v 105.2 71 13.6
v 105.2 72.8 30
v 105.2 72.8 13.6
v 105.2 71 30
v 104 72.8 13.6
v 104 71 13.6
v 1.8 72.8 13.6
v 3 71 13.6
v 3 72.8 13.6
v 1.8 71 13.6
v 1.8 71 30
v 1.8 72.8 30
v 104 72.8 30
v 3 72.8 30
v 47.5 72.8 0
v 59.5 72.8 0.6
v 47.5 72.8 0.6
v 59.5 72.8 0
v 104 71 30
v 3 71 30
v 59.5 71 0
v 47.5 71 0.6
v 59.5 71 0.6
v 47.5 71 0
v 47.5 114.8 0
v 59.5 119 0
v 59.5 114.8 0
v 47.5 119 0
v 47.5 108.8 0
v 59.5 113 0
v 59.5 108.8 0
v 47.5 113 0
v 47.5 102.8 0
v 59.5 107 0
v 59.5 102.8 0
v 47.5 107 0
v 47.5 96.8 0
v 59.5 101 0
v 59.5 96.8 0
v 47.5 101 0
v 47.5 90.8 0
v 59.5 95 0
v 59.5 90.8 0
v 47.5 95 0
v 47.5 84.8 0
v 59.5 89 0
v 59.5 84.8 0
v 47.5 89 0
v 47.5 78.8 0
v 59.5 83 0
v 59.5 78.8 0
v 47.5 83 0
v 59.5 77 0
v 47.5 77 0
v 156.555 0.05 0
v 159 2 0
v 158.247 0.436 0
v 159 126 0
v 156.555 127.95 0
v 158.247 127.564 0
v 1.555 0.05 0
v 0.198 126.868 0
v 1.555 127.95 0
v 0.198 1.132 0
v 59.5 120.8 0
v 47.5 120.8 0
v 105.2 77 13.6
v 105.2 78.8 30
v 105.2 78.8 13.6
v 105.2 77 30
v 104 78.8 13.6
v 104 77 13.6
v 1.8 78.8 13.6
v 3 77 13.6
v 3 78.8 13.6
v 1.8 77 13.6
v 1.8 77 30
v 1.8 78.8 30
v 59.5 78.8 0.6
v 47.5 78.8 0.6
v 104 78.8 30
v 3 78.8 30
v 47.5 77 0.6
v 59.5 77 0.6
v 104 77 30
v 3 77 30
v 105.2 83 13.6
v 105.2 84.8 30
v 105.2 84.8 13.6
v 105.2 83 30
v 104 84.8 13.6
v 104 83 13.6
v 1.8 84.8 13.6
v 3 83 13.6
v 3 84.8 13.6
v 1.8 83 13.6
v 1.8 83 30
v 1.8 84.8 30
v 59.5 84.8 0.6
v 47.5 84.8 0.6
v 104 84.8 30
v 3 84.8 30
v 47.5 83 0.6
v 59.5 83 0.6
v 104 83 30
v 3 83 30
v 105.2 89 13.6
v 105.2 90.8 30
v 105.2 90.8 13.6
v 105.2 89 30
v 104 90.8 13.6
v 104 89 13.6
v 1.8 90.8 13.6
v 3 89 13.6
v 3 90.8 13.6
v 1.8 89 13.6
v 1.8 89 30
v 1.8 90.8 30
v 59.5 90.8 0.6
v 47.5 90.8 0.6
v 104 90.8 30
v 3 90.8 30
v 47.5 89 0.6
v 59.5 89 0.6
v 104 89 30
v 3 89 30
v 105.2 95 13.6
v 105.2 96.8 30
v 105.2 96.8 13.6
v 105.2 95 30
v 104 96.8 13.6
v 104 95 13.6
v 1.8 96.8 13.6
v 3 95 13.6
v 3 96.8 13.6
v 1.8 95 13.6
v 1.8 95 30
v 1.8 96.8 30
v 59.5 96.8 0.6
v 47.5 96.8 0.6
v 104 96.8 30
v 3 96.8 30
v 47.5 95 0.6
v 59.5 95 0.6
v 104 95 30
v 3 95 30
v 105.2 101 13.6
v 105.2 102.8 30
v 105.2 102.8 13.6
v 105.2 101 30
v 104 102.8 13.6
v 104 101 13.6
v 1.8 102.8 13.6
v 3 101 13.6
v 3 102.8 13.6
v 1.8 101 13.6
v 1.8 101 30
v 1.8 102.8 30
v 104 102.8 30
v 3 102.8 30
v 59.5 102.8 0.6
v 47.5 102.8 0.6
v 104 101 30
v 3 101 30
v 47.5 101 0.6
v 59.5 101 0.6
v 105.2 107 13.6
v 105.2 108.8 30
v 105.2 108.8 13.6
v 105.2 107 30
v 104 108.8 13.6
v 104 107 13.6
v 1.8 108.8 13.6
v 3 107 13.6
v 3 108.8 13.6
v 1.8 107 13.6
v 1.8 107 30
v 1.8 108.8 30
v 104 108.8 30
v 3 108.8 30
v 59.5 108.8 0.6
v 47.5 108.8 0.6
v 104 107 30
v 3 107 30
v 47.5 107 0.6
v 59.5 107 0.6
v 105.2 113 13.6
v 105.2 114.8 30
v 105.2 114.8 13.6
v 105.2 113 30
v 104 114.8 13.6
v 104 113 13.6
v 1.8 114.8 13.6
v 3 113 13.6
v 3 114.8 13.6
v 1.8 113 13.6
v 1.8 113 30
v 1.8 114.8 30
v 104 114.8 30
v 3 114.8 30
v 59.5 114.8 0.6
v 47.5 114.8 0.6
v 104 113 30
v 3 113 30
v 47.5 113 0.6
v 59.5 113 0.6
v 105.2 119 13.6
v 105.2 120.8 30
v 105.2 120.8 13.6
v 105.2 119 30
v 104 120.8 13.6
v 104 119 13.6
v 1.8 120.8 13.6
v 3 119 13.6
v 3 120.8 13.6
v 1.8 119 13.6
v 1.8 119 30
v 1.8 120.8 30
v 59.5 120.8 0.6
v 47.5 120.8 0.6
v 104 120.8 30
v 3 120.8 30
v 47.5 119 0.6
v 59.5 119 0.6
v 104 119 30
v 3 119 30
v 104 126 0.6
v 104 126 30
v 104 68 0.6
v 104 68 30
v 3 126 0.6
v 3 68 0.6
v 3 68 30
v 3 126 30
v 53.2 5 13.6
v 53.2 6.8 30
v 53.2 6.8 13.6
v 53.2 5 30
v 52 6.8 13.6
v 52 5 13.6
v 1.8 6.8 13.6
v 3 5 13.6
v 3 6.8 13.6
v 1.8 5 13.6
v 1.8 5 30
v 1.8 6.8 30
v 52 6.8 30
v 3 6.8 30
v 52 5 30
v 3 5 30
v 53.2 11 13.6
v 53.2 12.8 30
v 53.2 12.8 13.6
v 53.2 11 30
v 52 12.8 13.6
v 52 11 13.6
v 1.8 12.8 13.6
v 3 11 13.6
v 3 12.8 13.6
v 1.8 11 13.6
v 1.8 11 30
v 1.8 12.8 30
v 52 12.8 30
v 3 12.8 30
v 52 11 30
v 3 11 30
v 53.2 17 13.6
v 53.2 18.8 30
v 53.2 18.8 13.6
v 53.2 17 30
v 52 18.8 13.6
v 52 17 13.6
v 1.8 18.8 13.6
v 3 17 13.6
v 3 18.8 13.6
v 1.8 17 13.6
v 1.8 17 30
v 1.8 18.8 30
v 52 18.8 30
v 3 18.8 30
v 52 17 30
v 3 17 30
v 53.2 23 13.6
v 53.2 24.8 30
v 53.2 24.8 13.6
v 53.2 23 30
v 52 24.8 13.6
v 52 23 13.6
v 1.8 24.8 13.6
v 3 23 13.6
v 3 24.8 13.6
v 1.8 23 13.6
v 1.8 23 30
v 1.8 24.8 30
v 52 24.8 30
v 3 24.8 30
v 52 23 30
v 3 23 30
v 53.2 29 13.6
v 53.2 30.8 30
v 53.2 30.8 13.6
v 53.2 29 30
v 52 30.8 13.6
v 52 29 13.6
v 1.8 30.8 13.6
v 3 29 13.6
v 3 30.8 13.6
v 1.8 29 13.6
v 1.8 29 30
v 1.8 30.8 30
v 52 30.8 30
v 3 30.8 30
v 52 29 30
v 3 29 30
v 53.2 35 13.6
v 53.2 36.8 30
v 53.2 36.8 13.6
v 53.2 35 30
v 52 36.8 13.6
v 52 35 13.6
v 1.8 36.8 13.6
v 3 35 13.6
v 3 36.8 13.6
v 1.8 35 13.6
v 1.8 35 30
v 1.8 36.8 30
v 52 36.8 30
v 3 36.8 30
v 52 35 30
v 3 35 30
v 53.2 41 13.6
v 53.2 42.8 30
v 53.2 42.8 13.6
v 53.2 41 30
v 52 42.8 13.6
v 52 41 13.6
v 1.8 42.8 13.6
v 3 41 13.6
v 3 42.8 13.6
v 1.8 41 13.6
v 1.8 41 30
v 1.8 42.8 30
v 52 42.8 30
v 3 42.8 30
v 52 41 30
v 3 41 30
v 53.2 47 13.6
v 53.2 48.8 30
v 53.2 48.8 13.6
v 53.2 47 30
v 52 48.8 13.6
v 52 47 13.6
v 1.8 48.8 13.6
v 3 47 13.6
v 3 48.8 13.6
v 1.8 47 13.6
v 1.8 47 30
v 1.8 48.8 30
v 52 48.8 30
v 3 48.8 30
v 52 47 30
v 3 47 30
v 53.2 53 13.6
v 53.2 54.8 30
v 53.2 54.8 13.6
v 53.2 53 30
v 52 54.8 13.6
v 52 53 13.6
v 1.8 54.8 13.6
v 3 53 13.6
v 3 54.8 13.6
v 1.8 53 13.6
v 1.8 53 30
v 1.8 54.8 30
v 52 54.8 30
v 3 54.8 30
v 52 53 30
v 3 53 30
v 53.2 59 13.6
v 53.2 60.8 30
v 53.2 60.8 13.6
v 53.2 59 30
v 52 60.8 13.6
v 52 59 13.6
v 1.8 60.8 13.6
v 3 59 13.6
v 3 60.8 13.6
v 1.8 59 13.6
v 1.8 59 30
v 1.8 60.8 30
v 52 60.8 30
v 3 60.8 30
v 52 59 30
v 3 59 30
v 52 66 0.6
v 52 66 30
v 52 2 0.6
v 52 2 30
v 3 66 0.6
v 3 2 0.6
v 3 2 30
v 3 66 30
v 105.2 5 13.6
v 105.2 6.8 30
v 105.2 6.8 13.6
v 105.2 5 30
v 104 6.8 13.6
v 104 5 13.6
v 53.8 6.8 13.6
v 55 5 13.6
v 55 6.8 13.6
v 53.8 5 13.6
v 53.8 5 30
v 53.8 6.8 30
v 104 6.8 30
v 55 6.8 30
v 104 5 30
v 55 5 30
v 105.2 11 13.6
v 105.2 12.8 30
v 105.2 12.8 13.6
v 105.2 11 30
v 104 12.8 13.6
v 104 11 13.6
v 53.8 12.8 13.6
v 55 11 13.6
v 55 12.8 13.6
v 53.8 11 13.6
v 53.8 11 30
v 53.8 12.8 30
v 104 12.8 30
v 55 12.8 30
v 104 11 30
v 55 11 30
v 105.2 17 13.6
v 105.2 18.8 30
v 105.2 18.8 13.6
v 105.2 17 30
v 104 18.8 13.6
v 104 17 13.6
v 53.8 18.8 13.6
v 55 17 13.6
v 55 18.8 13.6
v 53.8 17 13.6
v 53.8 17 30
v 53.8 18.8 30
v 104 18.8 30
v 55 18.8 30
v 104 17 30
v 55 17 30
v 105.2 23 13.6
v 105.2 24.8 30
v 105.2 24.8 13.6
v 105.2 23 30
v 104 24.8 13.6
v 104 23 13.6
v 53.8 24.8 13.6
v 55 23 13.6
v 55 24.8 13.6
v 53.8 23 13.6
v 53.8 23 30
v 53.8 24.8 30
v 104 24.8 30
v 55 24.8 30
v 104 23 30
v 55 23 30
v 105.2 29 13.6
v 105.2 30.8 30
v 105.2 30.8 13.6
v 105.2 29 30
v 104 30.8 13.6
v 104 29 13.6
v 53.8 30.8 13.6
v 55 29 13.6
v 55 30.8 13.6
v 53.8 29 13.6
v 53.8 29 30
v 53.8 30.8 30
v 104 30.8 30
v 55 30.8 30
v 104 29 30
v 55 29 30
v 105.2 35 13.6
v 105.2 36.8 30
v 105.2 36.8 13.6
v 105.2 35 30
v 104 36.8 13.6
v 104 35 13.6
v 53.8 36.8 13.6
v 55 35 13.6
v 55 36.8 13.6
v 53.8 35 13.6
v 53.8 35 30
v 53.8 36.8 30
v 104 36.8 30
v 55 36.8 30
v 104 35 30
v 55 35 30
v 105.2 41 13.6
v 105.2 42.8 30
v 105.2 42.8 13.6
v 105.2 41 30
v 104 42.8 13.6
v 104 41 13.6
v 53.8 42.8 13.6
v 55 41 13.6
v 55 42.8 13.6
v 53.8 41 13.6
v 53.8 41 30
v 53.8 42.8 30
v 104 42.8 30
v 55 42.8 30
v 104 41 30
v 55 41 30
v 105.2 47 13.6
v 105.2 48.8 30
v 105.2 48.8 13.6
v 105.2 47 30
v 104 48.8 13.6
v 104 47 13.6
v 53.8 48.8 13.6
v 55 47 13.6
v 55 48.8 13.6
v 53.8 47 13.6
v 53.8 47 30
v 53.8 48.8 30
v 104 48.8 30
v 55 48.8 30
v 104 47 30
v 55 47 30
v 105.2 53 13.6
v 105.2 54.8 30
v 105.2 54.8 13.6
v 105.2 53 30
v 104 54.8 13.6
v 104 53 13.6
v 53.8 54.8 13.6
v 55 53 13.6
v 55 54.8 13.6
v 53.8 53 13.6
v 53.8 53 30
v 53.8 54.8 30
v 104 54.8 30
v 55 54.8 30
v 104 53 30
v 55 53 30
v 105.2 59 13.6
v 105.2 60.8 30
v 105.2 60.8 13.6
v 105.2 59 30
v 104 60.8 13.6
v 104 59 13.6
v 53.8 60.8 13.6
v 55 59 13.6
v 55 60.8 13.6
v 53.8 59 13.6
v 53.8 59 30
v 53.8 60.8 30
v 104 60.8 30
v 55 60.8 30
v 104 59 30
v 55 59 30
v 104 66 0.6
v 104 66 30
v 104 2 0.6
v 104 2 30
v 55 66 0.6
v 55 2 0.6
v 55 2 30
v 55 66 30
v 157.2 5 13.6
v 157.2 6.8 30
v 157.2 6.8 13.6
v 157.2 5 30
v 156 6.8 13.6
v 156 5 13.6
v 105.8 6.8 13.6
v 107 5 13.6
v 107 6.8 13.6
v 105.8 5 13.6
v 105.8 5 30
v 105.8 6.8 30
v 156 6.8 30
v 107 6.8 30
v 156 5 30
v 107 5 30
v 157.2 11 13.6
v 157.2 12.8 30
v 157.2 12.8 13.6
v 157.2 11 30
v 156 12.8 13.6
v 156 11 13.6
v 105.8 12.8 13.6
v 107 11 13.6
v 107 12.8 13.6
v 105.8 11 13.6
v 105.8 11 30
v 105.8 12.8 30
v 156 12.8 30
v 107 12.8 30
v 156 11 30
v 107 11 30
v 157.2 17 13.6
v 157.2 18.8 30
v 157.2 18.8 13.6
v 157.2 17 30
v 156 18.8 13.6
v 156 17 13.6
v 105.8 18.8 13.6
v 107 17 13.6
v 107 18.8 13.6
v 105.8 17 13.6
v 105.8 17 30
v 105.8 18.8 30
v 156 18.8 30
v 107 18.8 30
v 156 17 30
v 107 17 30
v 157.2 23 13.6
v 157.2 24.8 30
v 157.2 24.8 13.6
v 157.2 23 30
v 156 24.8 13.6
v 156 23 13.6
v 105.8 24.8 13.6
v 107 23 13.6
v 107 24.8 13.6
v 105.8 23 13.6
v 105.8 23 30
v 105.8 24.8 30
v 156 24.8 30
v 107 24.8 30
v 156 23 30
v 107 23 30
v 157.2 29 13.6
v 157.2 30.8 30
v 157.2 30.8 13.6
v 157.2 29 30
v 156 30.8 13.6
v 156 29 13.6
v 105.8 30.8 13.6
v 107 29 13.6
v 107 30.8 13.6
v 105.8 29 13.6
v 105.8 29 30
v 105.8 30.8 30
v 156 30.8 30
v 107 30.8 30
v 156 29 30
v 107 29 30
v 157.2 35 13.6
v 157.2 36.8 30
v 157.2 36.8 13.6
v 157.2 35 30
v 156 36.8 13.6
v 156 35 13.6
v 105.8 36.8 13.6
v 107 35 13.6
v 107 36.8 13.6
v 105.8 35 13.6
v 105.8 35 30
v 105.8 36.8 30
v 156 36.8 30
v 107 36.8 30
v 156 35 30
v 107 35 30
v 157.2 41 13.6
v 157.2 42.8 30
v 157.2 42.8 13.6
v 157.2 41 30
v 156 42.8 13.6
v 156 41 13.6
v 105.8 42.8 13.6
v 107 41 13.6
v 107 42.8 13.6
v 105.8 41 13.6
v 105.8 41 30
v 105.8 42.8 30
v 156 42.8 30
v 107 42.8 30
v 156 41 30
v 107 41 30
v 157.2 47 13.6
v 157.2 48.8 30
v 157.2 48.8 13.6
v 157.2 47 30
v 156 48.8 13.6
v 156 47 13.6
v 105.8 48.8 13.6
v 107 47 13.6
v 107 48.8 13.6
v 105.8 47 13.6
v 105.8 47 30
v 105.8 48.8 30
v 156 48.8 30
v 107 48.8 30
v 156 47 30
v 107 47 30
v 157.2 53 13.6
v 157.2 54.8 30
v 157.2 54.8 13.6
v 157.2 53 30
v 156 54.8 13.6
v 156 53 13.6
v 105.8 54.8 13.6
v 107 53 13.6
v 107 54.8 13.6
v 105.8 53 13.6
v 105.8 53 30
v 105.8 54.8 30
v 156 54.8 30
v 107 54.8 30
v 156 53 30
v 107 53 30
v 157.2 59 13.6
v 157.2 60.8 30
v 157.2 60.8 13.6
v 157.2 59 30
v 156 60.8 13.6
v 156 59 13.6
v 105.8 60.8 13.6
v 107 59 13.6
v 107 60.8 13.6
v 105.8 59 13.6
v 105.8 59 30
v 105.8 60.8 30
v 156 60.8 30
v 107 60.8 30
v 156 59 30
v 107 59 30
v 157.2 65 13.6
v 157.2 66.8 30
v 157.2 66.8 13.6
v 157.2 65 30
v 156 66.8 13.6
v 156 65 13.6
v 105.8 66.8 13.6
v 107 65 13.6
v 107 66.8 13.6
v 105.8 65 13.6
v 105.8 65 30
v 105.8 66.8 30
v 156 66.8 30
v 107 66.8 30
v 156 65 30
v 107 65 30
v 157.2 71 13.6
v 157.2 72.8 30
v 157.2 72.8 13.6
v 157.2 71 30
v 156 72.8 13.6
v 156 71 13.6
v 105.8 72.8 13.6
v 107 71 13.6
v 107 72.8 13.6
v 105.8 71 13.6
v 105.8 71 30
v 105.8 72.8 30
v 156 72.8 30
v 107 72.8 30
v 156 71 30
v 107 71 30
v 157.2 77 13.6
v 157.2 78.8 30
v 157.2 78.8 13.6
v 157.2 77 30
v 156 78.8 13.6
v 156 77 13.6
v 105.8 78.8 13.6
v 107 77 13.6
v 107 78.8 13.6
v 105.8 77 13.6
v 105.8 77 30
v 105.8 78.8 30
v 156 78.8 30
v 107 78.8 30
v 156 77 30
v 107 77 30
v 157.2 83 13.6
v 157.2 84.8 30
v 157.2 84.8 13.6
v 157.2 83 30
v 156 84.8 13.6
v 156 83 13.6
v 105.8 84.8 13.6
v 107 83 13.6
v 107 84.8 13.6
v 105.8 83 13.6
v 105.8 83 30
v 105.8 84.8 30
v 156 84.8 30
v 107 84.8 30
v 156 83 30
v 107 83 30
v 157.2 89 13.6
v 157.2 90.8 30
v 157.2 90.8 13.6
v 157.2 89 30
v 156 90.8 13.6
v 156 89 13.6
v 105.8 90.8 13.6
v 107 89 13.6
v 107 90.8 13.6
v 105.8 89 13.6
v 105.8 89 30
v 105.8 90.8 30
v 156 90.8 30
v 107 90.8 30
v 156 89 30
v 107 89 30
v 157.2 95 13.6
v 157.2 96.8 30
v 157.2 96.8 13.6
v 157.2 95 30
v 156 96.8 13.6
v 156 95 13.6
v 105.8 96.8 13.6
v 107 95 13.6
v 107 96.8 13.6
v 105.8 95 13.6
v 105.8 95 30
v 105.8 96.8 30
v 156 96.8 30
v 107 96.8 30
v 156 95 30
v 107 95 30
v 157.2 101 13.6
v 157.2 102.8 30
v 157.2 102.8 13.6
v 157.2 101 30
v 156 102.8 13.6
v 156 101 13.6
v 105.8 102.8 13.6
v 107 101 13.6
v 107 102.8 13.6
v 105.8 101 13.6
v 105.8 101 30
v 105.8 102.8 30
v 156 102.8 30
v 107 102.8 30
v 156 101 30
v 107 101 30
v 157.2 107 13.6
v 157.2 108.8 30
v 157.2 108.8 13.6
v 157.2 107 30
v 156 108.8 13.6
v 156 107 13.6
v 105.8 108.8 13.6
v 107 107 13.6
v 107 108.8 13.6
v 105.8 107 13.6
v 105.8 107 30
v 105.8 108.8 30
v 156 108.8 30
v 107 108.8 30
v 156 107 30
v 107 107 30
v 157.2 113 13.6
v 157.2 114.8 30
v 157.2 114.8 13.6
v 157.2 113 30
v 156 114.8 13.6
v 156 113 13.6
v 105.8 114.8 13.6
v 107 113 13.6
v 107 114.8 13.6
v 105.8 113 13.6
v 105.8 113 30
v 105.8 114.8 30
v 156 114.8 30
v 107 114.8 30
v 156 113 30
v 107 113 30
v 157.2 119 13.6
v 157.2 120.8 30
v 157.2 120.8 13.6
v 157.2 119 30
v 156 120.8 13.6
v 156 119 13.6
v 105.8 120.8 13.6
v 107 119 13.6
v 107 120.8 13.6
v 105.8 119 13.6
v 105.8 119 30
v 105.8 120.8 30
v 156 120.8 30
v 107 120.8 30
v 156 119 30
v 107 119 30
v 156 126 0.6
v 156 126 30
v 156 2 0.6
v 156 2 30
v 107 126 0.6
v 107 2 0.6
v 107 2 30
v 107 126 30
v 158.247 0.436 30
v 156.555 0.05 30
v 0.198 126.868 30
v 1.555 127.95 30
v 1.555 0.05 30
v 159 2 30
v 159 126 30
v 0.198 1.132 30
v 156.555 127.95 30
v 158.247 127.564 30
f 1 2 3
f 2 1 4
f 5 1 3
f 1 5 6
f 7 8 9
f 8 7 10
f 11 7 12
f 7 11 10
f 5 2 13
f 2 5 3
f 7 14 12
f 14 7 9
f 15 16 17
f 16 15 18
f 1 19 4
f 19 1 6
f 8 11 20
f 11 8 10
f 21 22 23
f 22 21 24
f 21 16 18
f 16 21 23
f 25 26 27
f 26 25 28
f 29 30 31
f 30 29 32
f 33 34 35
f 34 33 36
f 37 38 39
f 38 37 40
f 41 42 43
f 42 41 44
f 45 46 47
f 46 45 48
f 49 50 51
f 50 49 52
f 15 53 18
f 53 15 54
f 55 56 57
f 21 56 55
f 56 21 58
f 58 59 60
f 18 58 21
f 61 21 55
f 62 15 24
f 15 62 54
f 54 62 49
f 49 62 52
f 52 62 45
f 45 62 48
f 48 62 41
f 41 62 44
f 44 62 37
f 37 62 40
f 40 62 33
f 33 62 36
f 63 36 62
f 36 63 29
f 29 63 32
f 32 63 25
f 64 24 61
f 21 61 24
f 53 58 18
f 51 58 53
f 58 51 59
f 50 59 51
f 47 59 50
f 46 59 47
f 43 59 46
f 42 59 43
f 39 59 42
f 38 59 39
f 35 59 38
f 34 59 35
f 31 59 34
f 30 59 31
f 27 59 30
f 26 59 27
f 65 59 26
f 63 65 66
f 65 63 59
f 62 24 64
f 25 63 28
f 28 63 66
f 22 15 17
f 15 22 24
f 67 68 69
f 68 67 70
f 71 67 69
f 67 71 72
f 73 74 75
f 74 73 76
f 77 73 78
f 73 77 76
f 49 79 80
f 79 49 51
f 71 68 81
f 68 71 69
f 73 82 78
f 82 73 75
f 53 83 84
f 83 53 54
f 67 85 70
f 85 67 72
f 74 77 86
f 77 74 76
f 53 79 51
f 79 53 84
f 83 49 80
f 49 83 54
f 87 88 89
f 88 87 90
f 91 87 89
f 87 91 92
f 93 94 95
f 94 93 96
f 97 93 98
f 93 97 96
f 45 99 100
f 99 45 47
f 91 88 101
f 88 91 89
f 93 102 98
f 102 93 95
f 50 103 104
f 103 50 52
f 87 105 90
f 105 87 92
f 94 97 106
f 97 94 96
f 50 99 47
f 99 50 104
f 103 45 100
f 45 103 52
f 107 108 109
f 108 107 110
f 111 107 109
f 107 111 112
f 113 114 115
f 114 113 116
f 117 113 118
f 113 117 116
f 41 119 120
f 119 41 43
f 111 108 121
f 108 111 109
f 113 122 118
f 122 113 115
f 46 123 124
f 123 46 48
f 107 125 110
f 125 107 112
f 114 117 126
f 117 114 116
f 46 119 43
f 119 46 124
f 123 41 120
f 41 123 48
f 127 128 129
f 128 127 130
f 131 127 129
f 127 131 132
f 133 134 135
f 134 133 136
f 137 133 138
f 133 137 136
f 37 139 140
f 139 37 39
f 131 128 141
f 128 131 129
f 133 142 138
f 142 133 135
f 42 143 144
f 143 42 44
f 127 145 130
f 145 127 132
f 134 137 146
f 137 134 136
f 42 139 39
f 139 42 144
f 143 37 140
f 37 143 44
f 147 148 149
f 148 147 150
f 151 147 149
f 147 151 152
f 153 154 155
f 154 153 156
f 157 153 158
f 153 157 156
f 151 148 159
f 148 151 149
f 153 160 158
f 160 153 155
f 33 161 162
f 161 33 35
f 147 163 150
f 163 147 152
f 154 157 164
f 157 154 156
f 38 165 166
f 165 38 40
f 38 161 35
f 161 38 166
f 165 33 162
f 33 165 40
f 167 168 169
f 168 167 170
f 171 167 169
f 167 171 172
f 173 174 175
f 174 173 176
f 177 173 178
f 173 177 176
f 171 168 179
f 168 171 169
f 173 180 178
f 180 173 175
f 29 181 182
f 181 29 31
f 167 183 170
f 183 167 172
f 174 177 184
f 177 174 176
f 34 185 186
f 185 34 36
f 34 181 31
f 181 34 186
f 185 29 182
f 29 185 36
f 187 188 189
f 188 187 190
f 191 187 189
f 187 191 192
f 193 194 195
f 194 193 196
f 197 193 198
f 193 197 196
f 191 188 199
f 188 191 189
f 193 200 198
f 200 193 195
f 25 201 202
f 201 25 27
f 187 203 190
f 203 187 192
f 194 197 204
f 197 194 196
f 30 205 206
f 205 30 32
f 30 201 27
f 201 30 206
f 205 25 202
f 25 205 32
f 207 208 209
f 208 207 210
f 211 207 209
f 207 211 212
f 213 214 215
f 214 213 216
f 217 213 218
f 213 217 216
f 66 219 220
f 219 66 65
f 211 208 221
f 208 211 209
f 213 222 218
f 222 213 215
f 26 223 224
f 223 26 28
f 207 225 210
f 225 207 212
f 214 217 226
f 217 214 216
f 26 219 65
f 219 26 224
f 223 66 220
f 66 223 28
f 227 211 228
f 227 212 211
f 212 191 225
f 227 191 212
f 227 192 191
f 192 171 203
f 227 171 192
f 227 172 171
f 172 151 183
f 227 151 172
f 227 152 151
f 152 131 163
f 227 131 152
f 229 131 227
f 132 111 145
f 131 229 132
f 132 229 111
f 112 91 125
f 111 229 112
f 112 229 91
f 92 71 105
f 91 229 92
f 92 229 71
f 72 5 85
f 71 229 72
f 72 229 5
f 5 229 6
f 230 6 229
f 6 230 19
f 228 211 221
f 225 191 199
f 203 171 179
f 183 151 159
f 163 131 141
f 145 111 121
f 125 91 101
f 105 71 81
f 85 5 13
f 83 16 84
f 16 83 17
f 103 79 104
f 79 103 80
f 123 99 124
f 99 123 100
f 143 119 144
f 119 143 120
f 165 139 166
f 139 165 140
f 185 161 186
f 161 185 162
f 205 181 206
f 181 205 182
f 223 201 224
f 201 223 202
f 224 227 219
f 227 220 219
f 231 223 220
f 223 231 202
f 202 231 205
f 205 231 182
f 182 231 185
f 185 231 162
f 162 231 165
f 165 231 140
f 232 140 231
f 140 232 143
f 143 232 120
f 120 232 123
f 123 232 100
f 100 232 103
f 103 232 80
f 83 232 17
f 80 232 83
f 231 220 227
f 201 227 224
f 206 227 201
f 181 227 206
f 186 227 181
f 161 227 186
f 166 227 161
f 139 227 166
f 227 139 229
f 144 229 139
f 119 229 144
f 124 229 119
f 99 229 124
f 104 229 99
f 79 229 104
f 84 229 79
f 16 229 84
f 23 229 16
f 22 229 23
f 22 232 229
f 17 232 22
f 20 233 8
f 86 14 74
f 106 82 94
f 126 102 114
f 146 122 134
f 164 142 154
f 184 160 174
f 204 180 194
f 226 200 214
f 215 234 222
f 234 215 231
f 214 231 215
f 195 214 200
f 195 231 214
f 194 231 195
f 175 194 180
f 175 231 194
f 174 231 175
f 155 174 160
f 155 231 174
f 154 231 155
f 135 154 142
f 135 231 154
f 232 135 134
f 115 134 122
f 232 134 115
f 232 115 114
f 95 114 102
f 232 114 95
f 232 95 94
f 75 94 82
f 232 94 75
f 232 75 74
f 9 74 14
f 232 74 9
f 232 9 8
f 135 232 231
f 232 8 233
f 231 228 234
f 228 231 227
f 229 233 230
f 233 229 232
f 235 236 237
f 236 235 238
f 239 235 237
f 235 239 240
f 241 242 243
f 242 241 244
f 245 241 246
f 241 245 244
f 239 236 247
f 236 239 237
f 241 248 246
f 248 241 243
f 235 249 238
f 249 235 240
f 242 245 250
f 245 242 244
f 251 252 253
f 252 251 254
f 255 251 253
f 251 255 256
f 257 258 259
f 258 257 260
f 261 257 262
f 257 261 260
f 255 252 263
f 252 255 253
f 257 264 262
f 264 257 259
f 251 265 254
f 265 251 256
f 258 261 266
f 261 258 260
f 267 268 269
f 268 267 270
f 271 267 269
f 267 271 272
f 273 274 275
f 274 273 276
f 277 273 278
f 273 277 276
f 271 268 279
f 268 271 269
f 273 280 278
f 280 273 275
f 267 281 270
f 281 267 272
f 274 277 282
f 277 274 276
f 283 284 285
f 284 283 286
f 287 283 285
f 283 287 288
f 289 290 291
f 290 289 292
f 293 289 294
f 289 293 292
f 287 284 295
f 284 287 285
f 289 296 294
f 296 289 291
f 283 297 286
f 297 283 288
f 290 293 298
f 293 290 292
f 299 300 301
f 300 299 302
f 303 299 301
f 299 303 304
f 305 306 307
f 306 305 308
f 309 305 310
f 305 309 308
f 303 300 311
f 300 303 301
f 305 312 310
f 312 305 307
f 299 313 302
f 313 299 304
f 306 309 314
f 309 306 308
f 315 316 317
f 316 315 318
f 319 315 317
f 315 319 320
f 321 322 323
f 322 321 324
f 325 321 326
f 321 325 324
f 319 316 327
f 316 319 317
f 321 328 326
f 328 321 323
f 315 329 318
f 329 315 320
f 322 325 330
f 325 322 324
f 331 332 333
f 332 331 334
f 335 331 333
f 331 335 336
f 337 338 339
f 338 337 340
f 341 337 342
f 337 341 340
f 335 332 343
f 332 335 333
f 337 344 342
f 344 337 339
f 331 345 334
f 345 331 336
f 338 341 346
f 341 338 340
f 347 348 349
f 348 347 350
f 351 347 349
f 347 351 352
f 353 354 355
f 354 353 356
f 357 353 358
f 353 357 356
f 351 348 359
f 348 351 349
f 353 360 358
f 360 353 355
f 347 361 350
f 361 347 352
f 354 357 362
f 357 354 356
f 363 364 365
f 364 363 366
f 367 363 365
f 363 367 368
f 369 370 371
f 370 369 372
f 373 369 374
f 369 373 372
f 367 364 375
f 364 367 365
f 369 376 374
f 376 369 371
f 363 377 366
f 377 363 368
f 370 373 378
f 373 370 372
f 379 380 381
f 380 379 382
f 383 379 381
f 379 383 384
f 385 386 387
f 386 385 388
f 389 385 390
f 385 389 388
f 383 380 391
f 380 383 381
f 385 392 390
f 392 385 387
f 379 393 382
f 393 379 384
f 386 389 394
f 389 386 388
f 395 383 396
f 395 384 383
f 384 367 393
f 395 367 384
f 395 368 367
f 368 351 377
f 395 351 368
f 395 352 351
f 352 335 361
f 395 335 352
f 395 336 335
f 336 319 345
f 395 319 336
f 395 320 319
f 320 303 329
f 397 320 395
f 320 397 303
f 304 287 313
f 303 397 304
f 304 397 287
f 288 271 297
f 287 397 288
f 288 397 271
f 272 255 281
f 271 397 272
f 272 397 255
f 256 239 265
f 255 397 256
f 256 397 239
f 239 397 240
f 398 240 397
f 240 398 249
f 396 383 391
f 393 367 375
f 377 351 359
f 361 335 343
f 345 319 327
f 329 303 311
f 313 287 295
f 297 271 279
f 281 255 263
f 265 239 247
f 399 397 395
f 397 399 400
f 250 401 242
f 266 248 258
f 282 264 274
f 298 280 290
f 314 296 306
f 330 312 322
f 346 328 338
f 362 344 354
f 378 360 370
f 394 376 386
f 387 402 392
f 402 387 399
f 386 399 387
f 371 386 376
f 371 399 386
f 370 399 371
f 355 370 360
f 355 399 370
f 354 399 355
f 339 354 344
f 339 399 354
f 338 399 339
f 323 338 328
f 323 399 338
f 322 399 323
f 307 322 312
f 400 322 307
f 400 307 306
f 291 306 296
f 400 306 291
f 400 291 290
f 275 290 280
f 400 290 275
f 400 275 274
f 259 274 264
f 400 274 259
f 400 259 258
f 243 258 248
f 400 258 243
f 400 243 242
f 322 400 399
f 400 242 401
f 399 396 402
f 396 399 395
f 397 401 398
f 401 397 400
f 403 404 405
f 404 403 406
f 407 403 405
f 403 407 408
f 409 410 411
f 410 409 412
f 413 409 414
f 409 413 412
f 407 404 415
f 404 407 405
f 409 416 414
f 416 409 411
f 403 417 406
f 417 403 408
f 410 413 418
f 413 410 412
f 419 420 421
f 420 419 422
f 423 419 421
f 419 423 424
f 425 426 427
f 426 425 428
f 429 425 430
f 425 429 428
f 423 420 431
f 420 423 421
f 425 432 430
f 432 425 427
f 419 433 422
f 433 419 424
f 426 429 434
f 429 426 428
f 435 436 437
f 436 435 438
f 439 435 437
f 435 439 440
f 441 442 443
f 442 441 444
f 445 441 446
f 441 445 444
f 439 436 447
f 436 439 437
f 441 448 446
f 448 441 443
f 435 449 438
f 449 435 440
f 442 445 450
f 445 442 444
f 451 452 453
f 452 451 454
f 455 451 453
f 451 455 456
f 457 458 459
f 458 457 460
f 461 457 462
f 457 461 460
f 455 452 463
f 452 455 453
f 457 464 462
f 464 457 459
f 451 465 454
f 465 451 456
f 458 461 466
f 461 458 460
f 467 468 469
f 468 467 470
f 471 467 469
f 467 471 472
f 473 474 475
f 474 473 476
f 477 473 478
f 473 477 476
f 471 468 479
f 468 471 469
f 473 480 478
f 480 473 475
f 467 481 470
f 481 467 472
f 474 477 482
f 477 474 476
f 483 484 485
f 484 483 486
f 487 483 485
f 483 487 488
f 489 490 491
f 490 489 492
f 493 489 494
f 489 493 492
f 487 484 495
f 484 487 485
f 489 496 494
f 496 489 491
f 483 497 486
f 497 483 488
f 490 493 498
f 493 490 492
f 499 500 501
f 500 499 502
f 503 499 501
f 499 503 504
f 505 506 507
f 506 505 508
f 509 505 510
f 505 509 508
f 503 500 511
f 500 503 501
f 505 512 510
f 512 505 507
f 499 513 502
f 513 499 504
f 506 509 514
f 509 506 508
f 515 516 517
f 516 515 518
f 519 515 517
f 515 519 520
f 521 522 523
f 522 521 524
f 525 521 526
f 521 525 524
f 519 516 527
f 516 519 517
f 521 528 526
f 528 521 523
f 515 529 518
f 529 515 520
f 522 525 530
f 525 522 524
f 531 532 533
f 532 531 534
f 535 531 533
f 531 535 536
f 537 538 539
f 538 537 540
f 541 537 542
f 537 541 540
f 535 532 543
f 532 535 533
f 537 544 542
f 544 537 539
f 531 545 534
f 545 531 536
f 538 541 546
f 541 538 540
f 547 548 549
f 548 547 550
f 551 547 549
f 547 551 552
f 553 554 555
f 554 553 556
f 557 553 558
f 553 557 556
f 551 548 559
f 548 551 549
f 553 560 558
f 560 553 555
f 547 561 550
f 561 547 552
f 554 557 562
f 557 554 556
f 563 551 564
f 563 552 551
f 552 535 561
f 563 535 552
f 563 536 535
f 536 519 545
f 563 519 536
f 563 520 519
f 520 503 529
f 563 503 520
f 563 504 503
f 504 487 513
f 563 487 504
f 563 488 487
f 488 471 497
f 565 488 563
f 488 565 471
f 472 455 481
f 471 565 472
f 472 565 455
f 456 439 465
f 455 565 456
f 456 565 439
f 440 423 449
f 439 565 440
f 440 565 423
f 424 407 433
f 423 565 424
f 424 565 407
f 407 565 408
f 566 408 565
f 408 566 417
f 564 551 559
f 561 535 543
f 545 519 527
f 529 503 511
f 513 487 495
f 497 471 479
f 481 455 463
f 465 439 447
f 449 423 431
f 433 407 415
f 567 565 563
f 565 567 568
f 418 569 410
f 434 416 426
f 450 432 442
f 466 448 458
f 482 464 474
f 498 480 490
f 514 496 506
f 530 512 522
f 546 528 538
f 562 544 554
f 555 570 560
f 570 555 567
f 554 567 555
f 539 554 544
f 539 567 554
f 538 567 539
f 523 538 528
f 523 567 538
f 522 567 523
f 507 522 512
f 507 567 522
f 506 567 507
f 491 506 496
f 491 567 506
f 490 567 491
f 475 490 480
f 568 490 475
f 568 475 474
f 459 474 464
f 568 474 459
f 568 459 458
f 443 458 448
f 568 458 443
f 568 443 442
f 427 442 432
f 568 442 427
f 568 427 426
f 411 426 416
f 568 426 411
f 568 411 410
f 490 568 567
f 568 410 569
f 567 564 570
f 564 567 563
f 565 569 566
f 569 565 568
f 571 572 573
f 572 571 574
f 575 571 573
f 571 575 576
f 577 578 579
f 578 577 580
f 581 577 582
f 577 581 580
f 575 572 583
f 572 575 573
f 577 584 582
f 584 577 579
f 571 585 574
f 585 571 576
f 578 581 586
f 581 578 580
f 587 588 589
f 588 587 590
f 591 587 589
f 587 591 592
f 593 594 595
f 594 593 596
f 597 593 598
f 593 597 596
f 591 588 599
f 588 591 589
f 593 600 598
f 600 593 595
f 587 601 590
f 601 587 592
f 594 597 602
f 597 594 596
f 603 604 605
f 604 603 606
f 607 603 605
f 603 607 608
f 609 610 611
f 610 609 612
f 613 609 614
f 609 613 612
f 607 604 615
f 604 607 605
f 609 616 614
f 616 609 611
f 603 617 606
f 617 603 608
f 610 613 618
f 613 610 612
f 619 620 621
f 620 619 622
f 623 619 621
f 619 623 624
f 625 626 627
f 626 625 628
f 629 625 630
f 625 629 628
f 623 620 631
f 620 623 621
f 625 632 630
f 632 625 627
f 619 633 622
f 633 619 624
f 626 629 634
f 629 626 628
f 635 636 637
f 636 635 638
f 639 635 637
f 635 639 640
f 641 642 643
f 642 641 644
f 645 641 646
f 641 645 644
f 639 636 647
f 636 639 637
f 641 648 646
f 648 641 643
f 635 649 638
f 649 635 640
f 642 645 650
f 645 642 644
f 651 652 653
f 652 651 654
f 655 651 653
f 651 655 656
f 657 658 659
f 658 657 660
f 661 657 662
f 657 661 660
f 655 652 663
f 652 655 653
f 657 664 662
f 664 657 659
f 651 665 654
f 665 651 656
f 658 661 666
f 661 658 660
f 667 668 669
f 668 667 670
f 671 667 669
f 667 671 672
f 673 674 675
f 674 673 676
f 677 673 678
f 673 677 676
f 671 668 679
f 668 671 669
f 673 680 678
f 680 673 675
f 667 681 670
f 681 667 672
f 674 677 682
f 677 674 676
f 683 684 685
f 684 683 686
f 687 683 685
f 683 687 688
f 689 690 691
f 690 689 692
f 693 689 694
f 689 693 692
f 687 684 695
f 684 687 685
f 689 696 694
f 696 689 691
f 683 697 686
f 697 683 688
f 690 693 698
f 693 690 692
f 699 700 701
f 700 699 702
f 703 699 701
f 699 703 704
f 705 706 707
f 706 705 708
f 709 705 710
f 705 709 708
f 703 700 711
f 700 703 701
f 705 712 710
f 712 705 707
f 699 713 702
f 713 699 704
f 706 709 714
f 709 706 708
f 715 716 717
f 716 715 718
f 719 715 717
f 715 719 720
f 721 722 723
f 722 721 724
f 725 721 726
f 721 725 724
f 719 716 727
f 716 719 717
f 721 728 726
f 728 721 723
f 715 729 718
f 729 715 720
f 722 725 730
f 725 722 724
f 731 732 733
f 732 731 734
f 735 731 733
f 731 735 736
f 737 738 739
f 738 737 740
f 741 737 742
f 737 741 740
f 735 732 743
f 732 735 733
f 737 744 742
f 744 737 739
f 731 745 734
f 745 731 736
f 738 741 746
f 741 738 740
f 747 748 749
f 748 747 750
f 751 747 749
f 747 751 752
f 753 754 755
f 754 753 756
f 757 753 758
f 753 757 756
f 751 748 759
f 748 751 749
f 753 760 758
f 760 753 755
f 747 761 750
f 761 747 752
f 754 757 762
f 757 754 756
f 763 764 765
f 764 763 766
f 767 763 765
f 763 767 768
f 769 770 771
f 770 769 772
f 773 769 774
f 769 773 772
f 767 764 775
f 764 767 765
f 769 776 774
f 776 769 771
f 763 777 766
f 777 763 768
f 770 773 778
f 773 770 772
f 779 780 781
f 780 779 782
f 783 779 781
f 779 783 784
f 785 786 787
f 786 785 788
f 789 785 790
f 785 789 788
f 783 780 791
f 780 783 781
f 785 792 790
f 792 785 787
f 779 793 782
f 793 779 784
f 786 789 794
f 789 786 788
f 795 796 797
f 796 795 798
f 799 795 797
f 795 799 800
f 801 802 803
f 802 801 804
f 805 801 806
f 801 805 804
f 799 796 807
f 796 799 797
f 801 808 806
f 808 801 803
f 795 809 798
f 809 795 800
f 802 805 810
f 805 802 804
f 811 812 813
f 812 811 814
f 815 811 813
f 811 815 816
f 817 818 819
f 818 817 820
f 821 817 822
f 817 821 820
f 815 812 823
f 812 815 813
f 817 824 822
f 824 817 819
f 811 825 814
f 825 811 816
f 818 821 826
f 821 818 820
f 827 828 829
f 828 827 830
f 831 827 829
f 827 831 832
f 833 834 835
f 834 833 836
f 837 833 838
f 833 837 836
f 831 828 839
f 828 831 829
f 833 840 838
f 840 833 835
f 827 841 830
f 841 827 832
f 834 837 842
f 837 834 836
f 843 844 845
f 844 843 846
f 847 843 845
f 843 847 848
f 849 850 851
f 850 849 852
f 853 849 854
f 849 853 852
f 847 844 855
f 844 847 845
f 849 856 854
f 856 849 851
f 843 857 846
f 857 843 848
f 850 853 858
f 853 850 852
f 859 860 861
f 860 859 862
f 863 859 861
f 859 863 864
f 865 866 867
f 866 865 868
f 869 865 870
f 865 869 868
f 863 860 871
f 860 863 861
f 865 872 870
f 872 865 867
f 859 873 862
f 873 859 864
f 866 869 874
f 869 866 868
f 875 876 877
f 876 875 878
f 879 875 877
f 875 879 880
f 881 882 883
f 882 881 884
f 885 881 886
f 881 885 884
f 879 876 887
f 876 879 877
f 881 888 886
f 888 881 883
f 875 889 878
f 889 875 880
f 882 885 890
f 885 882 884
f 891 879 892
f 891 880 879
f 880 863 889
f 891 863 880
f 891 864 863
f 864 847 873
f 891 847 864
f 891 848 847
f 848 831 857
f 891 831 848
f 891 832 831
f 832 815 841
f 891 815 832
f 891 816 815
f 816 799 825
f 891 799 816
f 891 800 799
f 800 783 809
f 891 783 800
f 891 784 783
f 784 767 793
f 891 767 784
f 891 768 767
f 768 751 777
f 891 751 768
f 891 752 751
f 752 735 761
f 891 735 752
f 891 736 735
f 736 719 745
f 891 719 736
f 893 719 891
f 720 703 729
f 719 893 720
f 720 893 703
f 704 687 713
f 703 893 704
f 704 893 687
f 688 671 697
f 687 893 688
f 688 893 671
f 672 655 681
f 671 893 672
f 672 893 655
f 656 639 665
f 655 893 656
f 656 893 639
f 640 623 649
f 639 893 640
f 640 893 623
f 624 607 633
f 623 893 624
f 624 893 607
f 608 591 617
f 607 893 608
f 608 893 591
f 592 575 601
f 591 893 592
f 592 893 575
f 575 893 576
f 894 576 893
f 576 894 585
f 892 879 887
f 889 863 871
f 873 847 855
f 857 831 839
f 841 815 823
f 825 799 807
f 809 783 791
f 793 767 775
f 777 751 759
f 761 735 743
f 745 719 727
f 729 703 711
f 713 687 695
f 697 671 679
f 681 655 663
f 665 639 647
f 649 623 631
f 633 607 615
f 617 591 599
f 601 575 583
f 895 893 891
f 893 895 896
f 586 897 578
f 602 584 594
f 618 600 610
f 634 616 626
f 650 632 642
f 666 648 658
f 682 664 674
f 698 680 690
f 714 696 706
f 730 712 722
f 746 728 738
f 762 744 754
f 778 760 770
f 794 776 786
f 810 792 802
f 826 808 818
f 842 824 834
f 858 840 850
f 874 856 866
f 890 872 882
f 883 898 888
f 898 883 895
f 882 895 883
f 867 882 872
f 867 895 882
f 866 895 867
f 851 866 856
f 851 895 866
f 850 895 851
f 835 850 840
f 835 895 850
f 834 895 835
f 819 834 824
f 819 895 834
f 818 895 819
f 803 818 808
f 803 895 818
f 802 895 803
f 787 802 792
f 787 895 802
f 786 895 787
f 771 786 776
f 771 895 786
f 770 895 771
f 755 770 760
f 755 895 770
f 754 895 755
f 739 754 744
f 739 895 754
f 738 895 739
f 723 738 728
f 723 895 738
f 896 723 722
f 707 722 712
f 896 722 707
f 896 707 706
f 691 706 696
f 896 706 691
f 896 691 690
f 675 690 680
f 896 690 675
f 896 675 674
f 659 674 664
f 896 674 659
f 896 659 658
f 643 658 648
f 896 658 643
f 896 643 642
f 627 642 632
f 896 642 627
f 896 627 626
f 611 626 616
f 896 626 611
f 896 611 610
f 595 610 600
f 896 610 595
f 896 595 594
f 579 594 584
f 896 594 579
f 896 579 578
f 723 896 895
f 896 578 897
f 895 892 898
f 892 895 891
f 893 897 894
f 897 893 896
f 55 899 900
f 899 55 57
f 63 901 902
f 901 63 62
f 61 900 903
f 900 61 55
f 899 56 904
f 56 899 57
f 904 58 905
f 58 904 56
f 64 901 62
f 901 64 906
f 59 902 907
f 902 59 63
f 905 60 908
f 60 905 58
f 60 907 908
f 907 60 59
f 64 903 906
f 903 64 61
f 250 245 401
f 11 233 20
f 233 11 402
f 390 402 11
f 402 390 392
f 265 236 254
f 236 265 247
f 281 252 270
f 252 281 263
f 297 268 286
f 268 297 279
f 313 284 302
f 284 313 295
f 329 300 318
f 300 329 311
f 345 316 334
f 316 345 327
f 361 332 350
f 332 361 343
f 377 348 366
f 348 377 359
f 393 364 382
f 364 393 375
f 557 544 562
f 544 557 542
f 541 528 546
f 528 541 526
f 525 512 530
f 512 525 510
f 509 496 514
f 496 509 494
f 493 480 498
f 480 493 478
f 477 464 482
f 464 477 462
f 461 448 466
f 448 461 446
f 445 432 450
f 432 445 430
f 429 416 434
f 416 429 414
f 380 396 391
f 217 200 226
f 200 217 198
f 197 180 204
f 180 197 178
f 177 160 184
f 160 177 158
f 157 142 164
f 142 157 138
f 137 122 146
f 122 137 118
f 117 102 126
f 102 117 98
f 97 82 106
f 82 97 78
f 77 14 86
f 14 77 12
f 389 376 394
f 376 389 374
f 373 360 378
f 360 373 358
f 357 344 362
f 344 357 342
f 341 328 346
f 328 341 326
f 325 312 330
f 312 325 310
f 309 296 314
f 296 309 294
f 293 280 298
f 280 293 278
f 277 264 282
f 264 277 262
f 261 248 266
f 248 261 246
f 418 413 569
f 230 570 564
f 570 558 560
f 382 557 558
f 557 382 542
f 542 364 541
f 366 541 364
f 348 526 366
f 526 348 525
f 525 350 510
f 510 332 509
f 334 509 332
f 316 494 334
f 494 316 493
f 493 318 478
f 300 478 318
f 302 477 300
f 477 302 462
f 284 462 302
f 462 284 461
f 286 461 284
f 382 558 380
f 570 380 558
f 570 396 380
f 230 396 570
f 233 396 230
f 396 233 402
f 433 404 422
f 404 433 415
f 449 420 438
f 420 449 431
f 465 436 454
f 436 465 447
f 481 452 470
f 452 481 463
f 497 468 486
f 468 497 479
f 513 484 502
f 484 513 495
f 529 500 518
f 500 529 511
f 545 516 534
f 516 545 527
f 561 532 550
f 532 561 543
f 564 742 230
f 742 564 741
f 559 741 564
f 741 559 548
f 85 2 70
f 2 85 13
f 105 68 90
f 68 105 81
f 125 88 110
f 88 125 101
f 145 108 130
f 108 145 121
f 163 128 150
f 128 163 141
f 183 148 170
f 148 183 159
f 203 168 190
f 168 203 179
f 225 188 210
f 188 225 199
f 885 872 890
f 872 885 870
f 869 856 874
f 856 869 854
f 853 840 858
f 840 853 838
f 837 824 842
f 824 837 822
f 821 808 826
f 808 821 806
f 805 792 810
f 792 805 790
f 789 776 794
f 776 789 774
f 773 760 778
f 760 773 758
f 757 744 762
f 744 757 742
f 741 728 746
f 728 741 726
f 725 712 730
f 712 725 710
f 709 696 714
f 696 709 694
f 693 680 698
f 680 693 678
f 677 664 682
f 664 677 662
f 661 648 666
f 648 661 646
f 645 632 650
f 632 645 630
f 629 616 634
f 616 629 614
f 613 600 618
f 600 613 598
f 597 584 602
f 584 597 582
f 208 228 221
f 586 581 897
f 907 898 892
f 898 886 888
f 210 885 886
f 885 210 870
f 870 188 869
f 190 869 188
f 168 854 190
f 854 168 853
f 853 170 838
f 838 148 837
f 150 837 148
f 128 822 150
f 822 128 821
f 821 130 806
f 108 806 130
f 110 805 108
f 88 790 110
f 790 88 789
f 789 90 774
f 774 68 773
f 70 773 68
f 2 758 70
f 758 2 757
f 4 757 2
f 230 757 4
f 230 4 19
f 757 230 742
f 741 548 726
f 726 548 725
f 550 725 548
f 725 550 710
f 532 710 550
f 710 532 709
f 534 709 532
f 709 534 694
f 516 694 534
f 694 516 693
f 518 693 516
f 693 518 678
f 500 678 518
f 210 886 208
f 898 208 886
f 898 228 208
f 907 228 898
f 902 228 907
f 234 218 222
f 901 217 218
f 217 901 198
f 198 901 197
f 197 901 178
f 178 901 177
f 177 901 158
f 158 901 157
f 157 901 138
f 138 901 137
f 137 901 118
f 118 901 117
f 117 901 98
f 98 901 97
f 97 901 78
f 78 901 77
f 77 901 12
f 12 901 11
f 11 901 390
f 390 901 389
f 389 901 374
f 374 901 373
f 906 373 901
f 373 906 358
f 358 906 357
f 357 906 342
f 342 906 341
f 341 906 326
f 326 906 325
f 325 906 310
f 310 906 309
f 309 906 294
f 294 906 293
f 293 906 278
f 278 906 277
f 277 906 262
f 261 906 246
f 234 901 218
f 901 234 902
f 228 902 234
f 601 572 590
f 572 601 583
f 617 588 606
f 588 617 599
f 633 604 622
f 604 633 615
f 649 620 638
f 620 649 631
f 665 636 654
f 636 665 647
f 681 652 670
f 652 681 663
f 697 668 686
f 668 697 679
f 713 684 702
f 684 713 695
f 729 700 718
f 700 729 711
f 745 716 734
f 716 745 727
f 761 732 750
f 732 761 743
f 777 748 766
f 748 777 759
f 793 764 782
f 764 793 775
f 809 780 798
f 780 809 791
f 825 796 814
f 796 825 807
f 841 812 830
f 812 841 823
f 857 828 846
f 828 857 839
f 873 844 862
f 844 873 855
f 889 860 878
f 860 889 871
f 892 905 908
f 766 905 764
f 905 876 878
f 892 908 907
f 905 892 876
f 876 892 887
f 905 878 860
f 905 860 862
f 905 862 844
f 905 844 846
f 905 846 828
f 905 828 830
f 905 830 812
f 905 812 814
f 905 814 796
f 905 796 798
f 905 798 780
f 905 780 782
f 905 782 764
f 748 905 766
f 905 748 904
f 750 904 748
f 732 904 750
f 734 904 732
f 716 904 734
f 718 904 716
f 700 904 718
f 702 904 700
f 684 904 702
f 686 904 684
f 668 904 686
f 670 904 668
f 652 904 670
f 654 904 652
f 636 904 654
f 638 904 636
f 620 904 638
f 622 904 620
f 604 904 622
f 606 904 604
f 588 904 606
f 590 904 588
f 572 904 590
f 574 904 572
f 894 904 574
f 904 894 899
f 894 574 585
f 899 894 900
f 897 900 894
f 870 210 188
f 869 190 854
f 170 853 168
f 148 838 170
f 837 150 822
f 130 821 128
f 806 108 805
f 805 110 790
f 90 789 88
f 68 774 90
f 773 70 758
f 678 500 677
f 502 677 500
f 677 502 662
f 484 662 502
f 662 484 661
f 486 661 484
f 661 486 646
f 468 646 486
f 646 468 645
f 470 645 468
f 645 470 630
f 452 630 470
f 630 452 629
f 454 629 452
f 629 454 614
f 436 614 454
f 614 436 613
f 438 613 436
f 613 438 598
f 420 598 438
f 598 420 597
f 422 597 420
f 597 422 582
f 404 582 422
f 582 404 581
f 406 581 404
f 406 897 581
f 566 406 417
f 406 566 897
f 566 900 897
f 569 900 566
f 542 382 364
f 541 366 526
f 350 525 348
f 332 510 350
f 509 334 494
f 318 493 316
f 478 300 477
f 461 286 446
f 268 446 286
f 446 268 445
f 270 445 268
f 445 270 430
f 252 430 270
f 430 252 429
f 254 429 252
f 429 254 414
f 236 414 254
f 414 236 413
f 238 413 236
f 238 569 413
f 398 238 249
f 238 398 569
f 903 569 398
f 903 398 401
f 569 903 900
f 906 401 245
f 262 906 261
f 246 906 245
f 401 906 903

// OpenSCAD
module terrainTray() {
    chips = 12.4; // 12.2 + slop
    terrain = 12.6; // 12.4 + 
    difference() {
        cube([124,142,26]);
        //cylinder(h=26,d=144,$fn=6);
        translate([62,71,13]) rotate([0,0,30]) cylinder(h=26,d=142,$fn=6);
        
        translate([62,71-43,0.0]) { cylinder(d=30,h=1); translate([0,0,0.6]) cylinder(d=40.4,h=99); }
        translate([62,71,0.0]) { cylinder(d=30,h=1); translate([0,0,0.6]) cylinder(d=40.4,h=99); }
        translate([62,71+43,0.0]) { cylinder(d=30,h=1); translate([0,0,0.6]) cylinder(d=40.4,h=99); }
        translate([62+38,71+22,0.0]) { cylinder(d=30,h=1); translate([0,0,0.6]) cylinder(d=40.4,h=99); }
        translate([62+38,71-22,0.0]) { cylinder(d=30,h=1); translate([0,0,0.6]) cylinder(d=40.4,h=99); }
        translate([62-38,71+22,0.0]) { cylinder(d=30,h=1); translate([0,0,0.6]) cylinder(d=40.4,h=99); }
        translate([62-38,71-22,0.0]) { cylinder(d=30,h=1); translate([0,0,0.6]) cylinder(d=40.4,h=99); }
    }
}

//terrainTray();

module trayBand() {
    th = 0.5;
    difference() {
        cube([150+th*2,23+th*2,10]);
        translate([th,th,-1])cube([150,23,99]);
    }
}

//trayBand();

module roundTokenTray() {
    difference() {
        cube([2+40.4*4,128,13]);
        for (i=[0:5]) {
            for (j=[0:2]) {
                translate([i*27+14,1+(127/3)*j,13+0.6]) 
                    rotate([-90,0,0]) cylinder(d=26,h=(127/3)-1);
            }
        }
    }
    for (i=[0:5]) {
        for (j=[0:3]) {
            translate([i*27+14,(127/3)*j,13+0.6]) 
                rotate([-90,0,0]) difference() { cylinder(d=26,h=1); cylinder(d=13,h=1); }
        }
    }
}

//roundTokenTray();

module chipTray() {
    difference() {
        cube([1+40.4*4+1,128,20]);
        for (i=[0:3]) {
            for (j=[0:2]) {
                translate([1+i*40.4+20.2,1+j*(127/3),20+0.6]) 
                    rotate([-90,0,0]) cylinder(d=40.4,h=(127/3)-1,$fn=60);
            }
        }
    }
    for (i=[0:3]) {
        for (j=[0:3]) {
            translate([1+i*40.4+20.2,j*(127/3),20+0.6]) 
                rotate([-90,0,0]) difference() { cylinder(d=40.4,h=1,$fn=60); cylinder(d=27,h=1); }
        }
    }
}

// chipTray();

// roundTokenTray();


module cubeDiceTray() {
    rad=5;
    module roundedCube(vec) {
        hull() {
            translate([rad,rad,0]) cylinder(h=vec.z,r=rad);
            translate([rad,vec.y-rad,0]) cylinder(h=vec.z,r=rad);
            translate([vec.x-rad,vec.y-rad,0]) cylinder(h=vec.z,r=rad);
            translate([vec.x-rad,rad,0]) cylinder(h=vec.z,r=rad);
        }
    }
    module roundedWell(w,h) {
        hull() {
            translate([rad,rad,rad]) sphere(rad);
            translate([w-rad,rad,rad]) sphere(rad);
            translate([w-rad,h-rad,rad]) sphere(rad);
            translate([rad,h-rad,rad]) sphere(rad);
            translate([rad,rad,99]) sphere(rad);
            translate([w-rad,rad,99]) sphere(rad);
            translate([w-rad,h-rad,99]) sphere(rad);
            translate([rad,h-rad,99]) sphere(rad);
        }
    }
    module roundedWell2(x,y,label,w,h,thick = 1.2,so = 8) {
        if (len(label)) translate([x+w/2,y+h/2,thick-0.6]) linear_extrude(10) 
            text(label,halign="center",valign="center",size = so);
        translate([x,y,thick]) roundedWell(w,h);
    }
    difference() {
        roundedCube([150,170,22.4]);
        translate([1,170-41,0.6]) roundedCube([31,40,99]);
        translate([1+5,170-41+5,-1]) roundedCube([21,30,99]);
        roundedWell2(1,170-61,"d6",31,19,8);
        roundedWell2(33,170-61,"\u2665",32,60,5,20);
        roundedWell2(66,170-61,"Dice",83,60,8);
        for (i=[0:1]) {
            for (j=[0:3]) {
                translate([1+j*((150-5)/4+1),47+31*i,0.6]) roundedWell(145/4,30);
            }
        }
        roundedWell2(1,1,"Might",44,45);
        roundedWell2(46,1,"Speed",51,45);
        roundedWell2(98,1,"Status",51,45);
        
    }
}

//cubeDiceTray();

module cardTray() {
    rad=3;
    module roundedCube(vec) {
        hull() {
            translate([rad,rad,0]) cylinder(h=vec.z,r=rad);
            translate([rad,vec.y-rad,0]) cylinder(h=vec.z,r=rad);
            translate([vec.x-rad,vec.y-rad,0]) cylinder(h=vec.z,r=rad);
            translate([vec.x-rad,rad,0]) cylinder(h=vec.z,r=rad);
        }
    }
    difference() {
        roundedCube([136,128,45]);
        translate([1,1,0.6]) roundedCube([36,91,99]);
        translate([99,36,0.6]) roundedCube([36,91,99]);
        //translate([93,1,0.6]) roundedCube([48,40,99]);
        //translate([93,41,0.6]) roundedCube([44,40,99]);
        translate([1,93,0.6]) roundedCube([48,34,99]);
        translate([50,93,0.6]) roundedCube([48,34,99]);
        translate([87,1,0.6]) roundedCube([48,34,99]);
        translate([38,1,0.6]) roundedCube([48,34,99]);
        translate([38,36,0.6]) roundedCube([48,20,99]);
        translate([38,57,0.6]) roundedCube([48,35,99]);
        translate([87,36,0.6]) roundedCube([10,56,99]);
    }
}

// cardTray();

module tokenTray2() {
    rad=3;
    module roundedCube(vec) {
        hull() {
            translate([rad,rad,0]) cylinder(h=vec.z,r=rad);
            translate([rad,vec.y-rad,0]) cylinder(h=vec.z,r=rad);
            translate([vec.x-rad,vec.y-rad,0]) cylinder(h=vec.z,r=rad);
            translate([vec.x-rad,rad,0]) cylinder(h=vec.z,r=rad);
        }
    }

    difference() {
        roundedCube([27*4+1,128,27]);
        for (i=[0:3]) {
            for (j=[0:3]) {
                translate([27*i+14,27*j+14,0]) { 
                    cylinder(h=0.6,d=20); translate([0,0,0.6]) cylinder(h=99,d=26.2);
                }
            }
            translate([27*i+14,107.8,0.6+13]) rotate([-90,0,0]) cylinder(h=19.2,d=26.2);
            translate([27*i+1,107.8,0.6+13]) cube([26.2,19.2,99]);
            translate([27*i+14,107.8,0.6+13]) rotate([-90,0,0]) cylinder(h=21.2,d=18);
            translate([27*i+1+4,107.8,0.6+13]) cube([18,21.2,99]);
        }
    }
}

// tokenTray2();

module chipTray2() {
    rad=3;
    module roundedCube(vec) {
        hull() {
            translate([rad,rad,0]) cylinder(h=vec.z,r=rad);
            translate([rad,vec.y-rad,0]) cylinder(h=vec.z,r=rad);
            translate([vec.x-rad,vec.y-rad,0]) cylinder(h=vec.z,r=rad);
            translate([vec.x-rad,rad,0]) cylinder(h=vec.z,r=rad);
        }
    }

    difference() {
        roundedCube([142,128,21 /*68-27*/]);
        for (i=[0:6]) {
            for (j=[0:2]) {
                translate([i*20.5+2,22+42*j,0.6+20.2]) rotate([0,90,0]) 
                    cylinder(h=i==6?15:19.5,d=40.4,$fn=60);
            }
        }
    }
}

// chipTray2();

module cardTray2() {
    rad=3;
    module roundedCube(vec) {
        hull() {
            translate([rad,rad,0]) cylinder(h=vec.z,r=rad);
            translate([rad,vec.y-rad,0]) cylinder(h=vec.z,r=rad);
            translate([vec.x-rad,vec.y-rad,0]) cylinder(h=vec.z,r=rad);
            translate([vec.x-rad,rad,0]) cylinder(h=vec.z,r=rad);
        }
    }
    module roundedCube2(x,y,label,vec) {
        if (len(label)) translate([x+vec.x/2,y+vec.y/2,0.61]) linear_extrude(10) 
            text(label,halign="center",valign="center",size = vec.y < 20? 5 : 8);
        translate([x,y,1.21]) roundedCube(vec);
    }
    difference() {
        roundedCube([160,128,32]);
        roundedCube2(1,1,"Starting Spell",[48,13,99]); // starting spell
        roundedCube2(1,15,"Spell",[48,13,99]); // spell
        roundedCube2(1,29,"Items",[48,32,99]); // item
        roundedCube2(1,62,"",[48,7,99]); // extra
        roundedCube2(1,70,"",[48,13,99]); // extra
        roundedCube2(50,70,"",[48,13,99]); // extra
        
        roundedCube2(50,1,"Treasure",[48,35,99]); // treasure
        roundedCube2(50,37,"Deep Treasure",[48,18,99]); // deep treasure
        roundedCube2(50,56,"Mission",[48,13,99]); // mission
        
        roundedCube2(1,121,"Reference",[97,6,99]); // ref cards
        roundedCube2(1,110,"Class",[97,10,99]); // class cards
        roundedCube2(1,99,"Lineage",[97,10,99]); // lineage cards
        roundedCube2(1,84,"",[97,14,99]); // extra
       
        roundedCube2(99,1,"Misc",[60,126,99]); // extra
        /* translate([1,1,0.6]) roundedCube([36,91,99]);
        translate([99,36,0.6]) roundedCube([36,91,99]);
        //translate([93,1,0.6]) roundedCube([48,40,99]);
        //translate([93,41,0.6]) roundedCube([44,40,99]);
        translate([1,93,0.6]) roundedCube([48,34,99]);
        translate([50,93,0.6]) roundedCube([48,34,99]);
        translate([87,1,0.6]) roundedCube([48,34,99]);
        translate([38,1,0.6]) roundedCube([48,34,99]);
        translate([38,36,0.6]) roundedCube([48,20,99]);
        translate([38,57,0.6]) roundedCube([48,35,99]);
        translate([87,36,0.6]) roundedCube([10,56,99]); */
    }
}

// cardTray2();

/* difference() {
    sizes = [ 25.4, 25.6, 25.8, 26 ];
    cube([120,30,2.4]);
    for (i=[0:3]) {
        translate([14+ 28*i,15,0]) { cylinder(h=1,d=20); translate([0,0,0.4]) cylinder(h=2,d=sizes[i]);
        }
    }
}*/

module playerTokens() {
    rad=20;
    module roundedCube(vec) {
        hull() {
            translate([rad,rad,0]) cylinder(h=vec.z,r=rad);
            translate([rad,vec.y-rad,0]) cylinder(h=vec.z,r=rad);
            translate([vec.x-rad,vec.y-rad,0]) cylinder(h=vec.z,r=rad);
            translate([vec.x-rad,rad,0]) cylinder(h=vec.z,r=rad);
        }
    }
    difference() {
        roundedCube([160,128,2.6]);
        cx = 26.4;
        cy = 27;
        ix = 0.6;
        iy = 1.4;
        td = 25.9;
        for (j=[0:2]) {
            for (i=[0:4]) {
                translate([ix+i*cx + cx,j*cy*1.8+cy/2 + iy,-1]) {
                    cylinder(h=1.6,d=20);
                    translate([0,0,1.6]) cylinder(h=5,d=td);
                }
            }
        }
        for (j=[0:1]) {
            for (i=[0:5]) {
                translate([ix+i*cx + cx/2,cy*1.4+j*cy*1.8 + iy,-1]) {
                    cylinder(h=1.6,d=20);
                    translate([0,0,1.6]) cylinder(h=5,d=td);
                }
            }
        }
    }
}

//playerTokens();

module tokenTray3() {
    rad=3;
    module roundedCube(vec) {
        hull() {
            translate([rad,rad,0]) cylinder(h=vec.z,r=rad);
            translate([rad,vec.y-rad,0]) cylinder(h=vec.z,r=rad);
            translate([vec.x-rad,vec.y-rad,0]) cylinder(h=vec.z,r=rad);
            translate([vec.x-rad,rad,0]) cylinder(h=vec.z,r=rad);
        }
    }
    difference() {
        roundedCube([142,64,14]);
        for (i=[0:4])
            translate([i*28+15,2,13.6]) rotate([-90,0,0]) cylinder(d=26,h=60);
    }
}

/* difference() {
    cylinder(h=2,d=25.6);
    translate([-14,0,0]) cube([30,25.6/2,2]);
} */

//tokenTray3();


module cardTray3() {
    rad=2;
    module roundedCube(vec) {
        hull() {
            translate([rad,rad,0]) cylinder(h=vec.z,r=rad);
            translate([rad,vec.y-rad,0]) cylinder(h=vec.z,r=rad);
            translate([vec.x-rad,vec.y-rad,0]) cylinder(h=vec.z,r=rad);
            translate([vec.x-rad,rad,0]) cylinder(h=vec.z,r=rad);
        }
    }
    module well(x,y, w,h, step=6) {
        translate([x,y,0.6]) cube([w,h,99]);
        for (i=[0:floor((h-step)/step)]) {
            translate([x-1.2,step/2+i*step+y,13.6]) cube([w+2.4,1.8,99]);
            if (w > 50)
                translate([x+w/2-6,step/2+i*step+y,0]) cube([12,1.8,99]);
        }
    }
    difference() {
        roundedCube([159,128,30]);
        well(3,68, 101,58);
        well(3,2, 49,64);
        well(55,2, 49,64);
        well(107,2, 49,124);

     }
}

cardTray3();

/* module cardDivider(w) {
    rad=1;
    linear_extrude(0.8) {
        offset(r=rad) {
            polygon([ [0.2+rad,0+rad], [w-0.2-rad,0+rad], [w-0.2-rad,10+rad], [w+0.5-rad,10+rad], [w+0.5-rad,30-rad], 49
            [-0.5+rad,30-rad], [-0.5+rad,10+rad], [0.2+rad,10+rad] ]);
        }
    }
} */

/* union() {
    cube([49+1.6,16,1.6]);
    translate([1,0,0]) cube([48.6,28,1.6]);
} */

/* union() {
    cube([101+1.6,15,1.6]);
    translate([1,0,0]) cube([100.6,29,1.6]);
    translate([102.6/2-5,0,0]) cube([10,29.8,1.6]);
} */

// cardDivider(50.66);
//cardDivider(103);
